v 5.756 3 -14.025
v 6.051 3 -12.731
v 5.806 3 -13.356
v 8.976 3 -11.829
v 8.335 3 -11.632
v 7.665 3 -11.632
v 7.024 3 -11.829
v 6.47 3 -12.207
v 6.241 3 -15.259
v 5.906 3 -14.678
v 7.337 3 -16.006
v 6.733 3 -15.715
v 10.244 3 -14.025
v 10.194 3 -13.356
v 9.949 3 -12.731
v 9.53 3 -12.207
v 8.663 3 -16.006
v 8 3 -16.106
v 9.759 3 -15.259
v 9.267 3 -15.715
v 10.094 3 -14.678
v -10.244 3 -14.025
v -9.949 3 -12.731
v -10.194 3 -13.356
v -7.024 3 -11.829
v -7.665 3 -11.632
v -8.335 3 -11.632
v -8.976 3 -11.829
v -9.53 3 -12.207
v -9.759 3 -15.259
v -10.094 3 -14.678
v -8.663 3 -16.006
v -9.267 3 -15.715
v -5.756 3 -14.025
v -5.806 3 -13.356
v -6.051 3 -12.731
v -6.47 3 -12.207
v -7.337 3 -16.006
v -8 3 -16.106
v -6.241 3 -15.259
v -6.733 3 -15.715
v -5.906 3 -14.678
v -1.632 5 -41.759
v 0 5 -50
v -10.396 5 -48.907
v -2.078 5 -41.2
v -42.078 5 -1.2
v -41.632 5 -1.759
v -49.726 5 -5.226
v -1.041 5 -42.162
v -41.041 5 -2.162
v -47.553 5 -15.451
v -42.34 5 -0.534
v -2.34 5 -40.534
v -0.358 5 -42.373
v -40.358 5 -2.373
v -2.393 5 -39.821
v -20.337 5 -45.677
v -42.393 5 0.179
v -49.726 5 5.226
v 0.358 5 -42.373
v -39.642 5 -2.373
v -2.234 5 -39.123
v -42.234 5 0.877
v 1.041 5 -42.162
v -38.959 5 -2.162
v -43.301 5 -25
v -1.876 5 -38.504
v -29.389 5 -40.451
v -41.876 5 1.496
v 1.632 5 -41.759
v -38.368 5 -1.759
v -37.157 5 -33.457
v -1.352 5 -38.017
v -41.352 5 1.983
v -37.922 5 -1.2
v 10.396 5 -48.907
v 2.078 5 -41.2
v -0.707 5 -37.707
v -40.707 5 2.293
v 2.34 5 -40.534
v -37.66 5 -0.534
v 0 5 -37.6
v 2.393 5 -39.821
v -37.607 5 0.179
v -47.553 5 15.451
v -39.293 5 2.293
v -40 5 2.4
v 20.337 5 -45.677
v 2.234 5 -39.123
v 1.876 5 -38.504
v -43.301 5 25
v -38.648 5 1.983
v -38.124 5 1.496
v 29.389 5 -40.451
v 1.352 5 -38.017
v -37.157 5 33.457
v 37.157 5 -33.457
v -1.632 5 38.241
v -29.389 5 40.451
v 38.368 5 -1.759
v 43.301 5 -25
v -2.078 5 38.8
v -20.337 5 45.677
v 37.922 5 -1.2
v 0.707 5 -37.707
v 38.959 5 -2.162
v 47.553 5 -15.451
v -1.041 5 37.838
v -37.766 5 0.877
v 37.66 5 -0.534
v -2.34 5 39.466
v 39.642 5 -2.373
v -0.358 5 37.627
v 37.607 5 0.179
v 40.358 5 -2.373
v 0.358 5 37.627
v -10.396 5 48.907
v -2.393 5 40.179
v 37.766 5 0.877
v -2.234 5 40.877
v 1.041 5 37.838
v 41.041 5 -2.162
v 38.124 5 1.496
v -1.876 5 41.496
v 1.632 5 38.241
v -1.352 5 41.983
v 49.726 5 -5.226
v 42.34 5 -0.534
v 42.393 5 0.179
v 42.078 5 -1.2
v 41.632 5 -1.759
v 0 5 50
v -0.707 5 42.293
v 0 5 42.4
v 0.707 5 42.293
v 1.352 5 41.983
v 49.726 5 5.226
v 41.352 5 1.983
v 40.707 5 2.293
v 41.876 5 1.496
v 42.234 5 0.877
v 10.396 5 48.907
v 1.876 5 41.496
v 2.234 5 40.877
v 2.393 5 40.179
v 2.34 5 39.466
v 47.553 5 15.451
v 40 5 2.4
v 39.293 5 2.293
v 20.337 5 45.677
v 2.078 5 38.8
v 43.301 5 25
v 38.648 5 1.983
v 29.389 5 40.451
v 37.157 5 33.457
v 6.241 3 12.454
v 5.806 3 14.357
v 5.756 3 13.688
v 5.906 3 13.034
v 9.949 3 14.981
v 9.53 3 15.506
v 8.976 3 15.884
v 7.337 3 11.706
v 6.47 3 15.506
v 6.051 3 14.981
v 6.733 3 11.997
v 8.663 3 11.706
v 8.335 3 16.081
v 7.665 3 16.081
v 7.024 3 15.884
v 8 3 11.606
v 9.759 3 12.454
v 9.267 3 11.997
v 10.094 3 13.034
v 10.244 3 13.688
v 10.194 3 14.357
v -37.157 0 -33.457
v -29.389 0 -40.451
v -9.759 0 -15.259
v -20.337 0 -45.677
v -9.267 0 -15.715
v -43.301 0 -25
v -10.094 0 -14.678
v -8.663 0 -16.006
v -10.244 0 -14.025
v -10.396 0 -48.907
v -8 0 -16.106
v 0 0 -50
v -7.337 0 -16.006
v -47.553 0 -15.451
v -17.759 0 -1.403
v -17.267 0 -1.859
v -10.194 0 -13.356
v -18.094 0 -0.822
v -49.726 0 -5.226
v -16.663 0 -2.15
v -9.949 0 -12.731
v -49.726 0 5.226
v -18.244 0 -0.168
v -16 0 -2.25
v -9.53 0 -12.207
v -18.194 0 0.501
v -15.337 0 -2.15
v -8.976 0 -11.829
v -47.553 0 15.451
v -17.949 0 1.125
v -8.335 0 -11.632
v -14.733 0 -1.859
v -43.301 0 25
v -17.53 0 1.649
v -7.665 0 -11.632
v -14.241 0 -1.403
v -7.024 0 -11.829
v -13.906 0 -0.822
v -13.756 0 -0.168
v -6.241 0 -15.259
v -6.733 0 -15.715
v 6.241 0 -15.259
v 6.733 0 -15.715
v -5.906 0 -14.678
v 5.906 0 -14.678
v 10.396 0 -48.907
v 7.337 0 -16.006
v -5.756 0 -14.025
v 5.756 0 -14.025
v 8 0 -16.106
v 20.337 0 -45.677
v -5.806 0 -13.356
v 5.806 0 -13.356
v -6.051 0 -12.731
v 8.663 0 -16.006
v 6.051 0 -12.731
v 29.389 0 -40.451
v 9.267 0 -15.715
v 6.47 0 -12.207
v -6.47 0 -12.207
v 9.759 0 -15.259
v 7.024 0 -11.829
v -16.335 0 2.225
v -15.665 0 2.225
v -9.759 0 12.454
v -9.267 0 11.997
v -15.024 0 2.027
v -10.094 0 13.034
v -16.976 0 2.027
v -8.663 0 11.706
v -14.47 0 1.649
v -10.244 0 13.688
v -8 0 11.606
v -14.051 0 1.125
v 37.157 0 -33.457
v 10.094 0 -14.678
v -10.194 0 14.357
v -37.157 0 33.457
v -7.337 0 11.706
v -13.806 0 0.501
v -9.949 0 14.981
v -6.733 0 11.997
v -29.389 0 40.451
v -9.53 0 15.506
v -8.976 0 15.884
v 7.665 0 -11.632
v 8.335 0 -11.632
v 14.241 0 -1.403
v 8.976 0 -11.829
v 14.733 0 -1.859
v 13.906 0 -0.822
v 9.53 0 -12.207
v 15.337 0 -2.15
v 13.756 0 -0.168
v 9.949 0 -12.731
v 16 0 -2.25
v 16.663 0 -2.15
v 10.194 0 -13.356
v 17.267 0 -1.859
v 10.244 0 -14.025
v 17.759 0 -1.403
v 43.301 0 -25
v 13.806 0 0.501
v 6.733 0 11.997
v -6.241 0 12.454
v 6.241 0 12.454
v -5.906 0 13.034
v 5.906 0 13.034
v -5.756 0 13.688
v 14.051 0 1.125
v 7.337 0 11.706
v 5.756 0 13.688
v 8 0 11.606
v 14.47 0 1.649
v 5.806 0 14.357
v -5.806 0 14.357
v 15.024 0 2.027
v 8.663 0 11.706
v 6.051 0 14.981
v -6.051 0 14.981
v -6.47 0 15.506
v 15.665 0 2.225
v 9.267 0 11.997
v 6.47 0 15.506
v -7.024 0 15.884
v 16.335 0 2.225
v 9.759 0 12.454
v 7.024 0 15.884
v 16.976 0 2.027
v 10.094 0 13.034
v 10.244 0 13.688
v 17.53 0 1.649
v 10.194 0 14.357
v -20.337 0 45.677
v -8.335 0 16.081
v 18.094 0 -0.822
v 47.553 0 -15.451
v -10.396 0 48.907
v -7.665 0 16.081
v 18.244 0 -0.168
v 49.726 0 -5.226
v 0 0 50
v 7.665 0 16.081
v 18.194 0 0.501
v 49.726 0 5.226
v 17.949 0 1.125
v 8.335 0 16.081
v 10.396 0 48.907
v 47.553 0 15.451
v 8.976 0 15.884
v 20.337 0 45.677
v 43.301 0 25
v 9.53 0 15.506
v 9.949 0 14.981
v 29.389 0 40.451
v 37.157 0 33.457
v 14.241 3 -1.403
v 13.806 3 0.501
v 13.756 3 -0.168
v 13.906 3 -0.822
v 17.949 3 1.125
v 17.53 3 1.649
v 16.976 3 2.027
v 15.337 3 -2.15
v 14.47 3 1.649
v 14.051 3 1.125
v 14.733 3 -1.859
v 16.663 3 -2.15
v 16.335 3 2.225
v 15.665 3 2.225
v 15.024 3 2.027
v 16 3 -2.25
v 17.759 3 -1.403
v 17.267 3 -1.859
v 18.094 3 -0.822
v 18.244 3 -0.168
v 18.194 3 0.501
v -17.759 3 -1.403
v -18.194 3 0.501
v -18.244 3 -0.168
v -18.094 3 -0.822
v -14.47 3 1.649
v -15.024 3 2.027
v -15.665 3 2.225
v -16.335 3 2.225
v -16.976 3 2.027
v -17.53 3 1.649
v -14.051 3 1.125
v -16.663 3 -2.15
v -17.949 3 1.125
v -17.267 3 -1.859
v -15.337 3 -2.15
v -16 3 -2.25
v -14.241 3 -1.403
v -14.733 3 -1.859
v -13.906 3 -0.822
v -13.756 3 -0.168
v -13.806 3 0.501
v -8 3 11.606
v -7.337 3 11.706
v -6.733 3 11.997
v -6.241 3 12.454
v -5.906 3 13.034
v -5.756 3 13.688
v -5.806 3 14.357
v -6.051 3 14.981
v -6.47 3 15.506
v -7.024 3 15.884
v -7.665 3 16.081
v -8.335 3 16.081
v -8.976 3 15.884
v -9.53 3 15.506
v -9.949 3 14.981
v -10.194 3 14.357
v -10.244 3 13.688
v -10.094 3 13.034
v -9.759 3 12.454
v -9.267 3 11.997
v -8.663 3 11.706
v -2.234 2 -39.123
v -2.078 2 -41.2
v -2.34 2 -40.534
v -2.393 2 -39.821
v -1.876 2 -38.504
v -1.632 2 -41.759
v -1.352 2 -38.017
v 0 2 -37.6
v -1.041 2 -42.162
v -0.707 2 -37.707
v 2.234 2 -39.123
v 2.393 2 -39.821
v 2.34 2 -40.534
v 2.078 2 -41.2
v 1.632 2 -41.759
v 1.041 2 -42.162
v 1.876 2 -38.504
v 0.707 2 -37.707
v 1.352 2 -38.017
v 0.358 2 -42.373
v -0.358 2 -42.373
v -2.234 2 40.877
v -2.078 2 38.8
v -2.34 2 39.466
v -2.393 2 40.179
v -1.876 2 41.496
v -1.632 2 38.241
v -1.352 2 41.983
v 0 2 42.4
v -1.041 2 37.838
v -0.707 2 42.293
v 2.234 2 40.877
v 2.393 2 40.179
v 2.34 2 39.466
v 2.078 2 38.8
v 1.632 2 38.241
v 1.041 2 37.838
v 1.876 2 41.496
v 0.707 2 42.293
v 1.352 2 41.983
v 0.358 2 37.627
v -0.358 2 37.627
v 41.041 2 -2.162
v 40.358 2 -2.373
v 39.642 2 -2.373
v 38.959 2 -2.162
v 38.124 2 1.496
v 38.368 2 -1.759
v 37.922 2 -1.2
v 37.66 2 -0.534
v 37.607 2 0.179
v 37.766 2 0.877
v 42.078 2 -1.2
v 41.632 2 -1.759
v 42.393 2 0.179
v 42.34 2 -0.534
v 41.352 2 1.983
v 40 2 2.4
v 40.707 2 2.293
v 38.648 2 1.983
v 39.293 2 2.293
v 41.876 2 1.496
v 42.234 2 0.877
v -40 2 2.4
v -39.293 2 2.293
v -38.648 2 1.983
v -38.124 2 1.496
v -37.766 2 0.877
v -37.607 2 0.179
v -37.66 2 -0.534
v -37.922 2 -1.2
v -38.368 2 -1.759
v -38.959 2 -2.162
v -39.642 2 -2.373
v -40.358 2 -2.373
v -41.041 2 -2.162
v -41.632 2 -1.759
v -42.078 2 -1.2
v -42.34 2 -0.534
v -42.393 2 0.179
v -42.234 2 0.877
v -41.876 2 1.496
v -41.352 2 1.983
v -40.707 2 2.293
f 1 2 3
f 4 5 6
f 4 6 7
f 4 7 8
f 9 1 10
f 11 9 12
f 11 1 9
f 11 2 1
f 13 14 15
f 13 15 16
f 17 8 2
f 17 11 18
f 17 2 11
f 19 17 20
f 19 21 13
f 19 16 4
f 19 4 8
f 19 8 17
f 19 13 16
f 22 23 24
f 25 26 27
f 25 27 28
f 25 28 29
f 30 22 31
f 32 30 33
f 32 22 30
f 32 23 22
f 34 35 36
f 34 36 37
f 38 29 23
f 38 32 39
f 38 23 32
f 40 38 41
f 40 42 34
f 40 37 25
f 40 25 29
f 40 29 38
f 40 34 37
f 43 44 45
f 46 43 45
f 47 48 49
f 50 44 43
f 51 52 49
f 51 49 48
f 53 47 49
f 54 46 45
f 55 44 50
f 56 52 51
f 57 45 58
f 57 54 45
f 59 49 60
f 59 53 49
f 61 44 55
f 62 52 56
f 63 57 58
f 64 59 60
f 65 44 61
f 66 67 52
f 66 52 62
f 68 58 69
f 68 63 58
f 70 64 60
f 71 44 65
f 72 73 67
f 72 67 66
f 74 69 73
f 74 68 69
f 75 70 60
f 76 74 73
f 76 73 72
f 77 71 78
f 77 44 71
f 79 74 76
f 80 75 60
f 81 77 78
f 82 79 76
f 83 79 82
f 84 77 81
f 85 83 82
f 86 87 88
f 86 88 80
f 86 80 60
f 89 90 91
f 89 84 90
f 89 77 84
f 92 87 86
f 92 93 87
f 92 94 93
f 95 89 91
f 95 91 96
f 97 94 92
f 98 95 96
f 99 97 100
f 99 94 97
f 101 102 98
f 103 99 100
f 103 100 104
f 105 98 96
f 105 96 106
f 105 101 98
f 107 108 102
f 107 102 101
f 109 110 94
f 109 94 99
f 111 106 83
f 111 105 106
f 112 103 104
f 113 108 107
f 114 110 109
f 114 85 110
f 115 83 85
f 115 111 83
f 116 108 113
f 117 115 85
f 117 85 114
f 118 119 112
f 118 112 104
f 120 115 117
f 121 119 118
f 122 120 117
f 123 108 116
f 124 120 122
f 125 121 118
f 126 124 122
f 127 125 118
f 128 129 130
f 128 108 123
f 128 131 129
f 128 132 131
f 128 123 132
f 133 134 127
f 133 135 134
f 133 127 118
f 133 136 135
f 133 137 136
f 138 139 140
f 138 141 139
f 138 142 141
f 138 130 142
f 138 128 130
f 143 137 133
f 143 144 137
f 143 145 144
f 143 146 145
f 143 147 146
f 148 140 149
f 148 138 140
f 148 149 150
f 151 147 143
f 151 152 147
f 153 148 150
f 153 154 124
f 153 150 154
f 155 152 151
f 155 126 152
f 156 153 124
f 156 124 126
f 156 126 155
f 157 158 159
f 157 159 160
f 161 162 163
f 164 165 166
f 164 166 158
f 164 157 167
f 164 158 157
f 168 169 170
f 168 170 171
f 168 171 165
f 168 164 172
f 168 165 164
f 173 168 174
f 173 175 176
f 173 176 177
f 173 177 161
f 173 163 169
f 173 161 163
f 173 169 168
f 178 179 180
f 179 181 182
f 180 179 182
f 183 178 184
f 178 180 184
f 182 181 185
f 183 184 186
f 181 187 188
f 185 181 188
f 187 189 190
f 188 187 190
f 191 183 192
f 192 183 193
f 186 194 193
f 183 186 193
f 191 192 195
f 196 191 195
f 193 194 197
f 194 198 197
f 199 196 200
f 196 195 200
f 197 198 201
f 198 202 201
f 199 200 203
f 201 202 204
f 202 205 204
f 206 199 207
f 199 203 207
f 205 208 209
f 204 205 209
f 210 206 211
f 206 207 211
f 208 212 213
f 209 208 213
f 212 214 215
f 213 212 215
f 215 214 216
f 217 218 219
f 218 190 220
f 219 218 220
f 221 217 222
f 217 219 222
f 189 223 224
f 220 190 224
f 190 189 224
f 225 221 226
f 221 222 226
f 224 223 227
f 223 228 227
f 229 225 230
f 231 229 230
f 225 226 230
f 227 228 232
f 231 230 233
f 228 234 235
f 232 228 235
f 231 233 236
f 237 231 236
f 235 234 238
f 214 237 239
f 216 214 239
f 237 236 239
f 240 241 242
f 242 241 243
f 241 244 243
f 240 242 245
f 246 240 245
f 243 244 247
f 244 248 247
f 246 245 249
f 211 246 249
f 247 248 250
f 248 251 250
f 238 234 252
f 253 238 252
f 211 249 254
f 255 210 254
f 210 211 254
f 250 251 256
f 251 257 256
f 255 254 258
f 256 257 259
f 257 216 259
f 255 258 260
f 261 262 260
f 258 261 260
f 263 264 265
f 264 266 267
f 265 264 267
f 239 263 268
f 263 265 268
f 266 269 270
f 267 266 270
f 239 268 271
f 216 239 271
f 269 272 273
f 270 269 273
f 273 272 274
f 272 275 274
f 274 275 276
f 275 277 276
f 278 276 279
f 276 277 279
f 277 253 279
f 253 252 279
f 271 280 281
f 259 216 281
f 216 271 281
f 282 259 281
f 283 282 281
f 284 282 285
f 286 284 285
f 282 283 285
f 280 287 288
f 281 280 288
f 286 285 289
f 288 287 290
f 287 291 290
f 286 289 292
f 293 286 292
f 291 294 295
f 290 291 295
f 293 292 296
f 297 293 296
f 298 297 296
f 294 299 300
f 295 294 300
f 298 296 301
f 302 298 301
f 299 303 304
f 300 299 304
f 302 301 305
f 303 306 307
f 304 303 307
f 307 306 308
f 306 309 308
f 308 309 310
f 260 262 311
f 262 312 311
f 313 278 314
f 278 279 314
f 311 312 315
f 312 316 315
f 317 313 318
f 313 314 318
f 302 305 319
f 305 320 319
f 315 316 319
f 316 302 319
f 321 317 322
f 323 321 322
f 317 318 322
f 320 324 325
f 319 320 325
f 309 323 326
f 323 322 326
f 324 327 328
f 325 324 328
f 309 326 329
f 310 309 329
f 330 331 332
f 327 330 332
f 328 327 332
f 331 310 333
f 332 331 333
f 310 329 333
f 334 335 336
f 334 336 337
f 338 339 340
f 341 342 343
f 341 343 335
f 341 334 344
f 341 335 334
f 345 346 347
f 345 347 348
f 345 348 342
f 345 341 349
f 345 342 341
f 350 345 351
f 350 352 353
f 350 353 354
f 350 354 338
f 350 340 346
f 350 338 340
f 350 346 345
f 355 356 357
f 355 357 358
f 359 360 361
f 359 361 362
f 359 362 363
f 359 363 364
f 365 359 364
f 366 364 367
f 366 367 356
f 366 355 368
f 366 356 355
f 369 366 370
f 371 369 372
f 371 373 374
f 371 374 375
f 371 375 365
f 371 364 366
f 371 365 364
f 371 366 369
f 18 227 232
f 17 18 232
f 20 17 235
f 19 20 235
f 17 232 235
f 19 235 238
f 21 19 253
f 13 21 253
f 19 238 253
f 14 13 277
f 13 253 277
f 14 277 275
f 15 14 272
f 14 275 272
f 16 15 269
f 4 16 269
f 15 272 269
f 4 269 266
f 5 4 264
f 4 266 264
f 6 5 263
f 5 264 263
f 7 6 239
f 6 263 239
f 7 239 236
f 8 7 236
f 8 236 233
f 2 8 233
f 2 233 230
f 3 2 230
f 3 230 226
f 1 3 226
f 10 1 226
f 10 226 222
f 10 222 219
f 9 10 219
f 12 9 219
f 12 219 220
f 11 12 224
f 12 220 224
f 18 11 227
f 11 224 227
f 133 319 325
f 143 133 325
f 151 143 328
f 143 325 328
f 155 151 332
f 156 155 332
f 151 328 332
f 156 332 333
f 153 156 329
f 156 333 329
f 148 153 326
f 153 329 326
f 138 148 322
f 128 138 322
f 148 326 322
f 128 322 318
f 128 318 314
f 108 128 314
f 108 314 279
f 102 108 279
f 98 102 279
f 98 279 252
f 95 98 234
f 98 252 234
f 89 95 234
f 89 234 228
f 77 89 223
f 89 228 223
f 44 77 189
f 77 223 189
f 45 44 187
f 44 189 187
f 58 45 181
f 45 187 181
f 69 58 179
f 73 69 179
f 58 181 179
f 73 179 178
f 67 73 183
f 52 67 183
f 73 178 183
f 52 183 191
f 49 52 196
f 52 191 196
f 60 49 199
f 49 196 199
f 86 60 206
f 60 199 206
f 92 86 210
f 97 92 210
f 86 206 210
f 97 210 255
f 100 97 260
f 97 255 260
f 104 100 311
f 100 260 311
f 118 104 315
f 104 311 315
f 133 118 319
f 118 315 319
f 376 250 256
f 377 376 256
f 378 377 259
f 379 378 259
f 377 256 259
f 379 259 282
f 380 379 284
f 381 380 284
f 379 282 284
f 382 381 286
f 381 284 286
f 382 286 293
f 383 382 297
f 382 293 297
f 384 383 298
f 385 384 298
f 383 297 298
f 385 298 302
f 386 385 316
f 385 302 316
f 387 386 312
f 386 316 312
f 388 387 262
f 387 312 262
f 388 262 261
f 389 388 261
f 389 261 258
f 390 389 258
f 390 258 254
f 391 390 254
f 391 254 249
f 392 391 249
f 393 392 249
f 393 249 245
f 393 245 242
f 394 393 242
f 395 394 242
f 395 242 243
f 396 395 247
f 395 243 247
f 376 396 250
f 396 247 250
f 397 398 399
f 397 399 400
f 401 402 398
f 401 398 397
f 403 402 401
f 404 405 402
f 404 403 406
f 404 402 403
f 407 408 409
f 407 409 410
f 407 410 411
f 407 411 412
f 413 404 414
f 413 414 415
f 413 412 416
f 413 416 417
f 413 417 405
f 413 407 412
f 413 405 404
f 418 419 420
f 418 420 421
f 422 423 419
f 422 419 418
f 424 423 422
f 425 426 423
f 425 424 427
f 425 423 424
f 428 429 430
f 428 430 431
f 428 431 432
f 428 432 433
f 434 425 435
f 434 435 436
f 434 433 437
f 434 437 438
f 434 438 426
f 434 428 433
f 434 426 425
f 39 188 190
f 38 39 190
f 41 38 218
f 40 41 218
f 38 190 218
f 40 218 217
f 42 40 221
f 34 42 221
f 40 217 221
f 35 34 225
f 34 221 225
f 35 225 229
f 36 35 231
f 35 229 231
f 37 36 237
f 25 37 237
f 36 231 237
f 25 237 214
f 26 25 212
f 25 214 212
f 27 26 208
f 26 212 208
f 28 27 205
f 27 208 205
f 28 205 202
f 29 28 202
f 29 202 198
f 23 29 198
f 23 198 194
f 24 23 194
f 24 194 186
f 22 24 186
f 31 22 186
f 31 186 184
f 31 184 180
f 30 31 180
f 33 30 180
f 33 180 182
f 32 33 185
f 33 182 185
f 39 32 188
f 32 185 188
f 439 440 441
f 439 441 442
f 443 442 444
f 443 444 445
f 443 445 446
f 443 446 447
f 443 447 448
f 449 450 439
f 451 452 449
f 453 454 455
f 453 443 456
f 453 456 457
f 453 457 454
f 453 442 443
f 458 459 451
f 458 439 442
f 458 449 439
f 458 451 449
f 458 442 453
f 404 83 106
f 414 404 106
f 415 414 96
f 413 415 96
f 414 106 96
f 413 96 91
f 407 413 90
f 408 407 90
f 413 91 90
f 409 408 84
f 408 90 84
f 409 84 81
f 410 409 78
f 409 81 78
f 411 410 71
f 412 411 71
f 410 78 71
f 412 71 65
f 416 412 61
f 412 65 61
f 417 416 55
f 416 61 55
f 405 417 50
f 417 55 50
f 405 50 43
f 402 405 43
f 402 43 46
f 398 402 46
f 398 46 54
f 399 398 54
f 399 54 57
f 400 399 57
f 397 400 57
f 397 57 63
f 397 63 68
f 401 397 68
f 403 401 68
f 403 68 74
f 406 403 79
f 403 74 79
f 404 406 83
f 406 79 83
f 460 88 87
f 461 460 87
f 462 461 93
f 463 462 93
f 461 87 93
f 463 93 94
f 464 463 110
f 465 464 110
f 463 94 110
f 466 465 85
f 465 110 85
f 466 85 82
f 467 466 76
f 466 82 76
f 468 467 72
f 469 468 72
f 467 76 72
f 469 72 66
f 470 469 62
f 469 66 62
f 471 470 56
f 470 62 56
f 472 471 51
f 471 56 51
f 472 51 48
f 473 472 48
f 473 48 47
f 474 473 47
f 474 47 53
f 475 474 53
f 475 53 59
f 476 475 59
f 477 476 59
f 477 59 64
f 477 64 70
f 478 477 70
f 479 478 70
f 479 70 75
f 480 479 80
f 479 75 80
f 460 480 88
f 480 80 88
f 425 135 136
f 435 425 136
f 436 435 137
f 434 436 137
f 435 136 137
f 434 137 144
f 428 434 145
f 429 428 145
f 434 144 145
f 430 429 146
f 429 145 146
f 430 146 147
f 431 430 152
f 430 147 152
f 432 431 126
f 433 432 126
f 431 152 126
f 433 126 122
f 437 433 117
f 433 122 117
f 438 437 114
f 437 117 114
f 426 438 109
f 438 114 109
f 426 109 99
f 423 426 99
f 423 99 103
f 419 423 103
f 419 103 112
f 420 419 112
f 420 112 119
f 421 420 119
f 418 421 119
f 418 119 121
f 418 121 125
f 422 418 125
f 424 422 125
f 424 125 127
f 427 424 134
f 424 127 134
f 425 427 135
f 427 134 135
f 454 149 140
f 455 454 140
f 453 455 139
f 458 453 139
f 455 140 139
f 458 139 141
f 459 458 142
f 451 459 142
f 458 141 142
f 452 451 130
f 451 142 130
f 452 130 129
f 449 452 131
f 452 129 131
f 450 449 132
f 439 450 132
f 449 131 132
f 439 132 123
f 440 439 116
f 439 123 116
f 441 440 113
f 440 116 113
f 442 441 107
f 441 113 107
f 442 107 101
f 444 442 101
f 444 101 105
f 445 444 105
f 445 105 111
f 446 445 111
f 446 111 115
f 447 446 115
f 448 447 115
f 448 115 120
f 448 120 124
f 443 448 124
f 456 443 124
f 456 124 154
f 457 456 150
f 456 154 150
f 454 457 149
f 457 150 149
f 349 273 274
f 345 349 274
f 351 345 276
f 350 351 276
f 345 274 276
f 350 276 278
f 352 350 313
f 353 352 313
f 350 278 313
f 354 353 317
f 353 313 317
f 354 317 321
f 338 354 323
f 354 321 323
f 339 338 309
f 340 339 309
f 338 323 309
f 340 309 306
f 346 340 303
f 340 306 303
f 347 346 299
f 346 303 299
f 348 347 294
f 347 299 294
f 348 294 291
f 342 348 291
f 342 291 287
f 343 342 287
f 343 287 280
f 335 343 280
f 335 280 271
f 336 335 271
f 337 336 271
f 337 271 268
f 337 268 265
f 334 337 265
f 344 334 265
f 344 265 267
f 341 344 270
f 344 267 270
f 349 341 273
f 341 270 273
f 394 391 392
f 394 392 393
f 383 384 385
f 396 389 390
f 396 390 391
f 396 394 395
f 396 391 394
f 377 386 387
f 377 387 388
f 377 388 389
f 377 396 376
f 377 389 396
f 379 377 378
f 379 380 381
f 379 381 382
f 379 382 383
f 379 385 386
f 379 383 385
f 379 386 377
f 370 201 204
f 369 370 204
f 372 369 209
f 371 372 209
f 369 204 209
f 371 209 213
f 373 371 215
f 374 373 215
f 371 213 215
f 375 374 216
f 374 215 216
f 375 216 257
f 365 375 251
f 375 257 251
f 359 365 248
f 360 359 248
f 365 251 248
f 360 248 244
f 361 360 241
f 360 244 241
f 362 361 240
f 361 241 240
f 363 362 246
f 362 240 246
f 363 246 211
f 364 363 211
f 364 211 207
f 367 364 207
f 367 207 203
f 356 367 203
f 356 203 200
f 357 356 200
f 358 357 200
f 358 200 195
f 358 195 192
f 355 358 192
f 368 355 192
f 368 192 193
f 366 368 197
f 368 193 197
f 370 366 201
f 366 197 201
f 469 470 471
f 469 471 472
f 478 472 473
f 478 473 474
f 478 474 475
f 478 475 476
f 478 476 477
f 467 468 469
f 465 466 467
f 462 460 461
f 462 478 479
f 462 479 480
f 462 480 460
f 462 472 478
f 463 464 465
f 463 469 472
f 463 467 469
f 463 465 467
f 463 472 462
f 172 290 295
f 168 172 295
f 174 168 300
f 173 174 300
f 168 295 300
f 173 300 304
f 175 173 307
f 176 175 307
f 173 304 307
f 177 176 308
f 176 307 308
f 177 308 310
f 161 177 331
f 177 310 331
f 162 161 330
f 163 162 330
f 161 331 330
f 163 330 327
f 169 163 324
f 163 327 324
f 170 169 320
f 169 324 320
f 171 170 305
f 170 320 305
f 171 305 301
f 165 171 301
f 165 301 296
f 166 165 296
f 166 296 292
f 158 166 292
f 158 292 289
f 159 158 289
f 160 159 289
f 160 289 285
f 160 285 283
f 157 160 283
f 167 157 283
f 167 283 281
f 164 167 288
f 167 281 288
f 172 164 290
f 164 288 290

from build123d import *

# Parameters (mm, degrees)
SKETCH_1_R          = 50
EXTRUDE_1_DEPTH     = 5
SKETCH_3_R          = 2.25
CUT_EXTRUDE_1_DEPTH = 3
SKETCH_4_R          = 2.4
CUT_EXTRUDE_2_DEPTH = 3


with BuildPart() as part:
    # 草图1 → 凸台-拉伸1 (new body)
    with BuildSketch(Plane(origin=(0, 0, 0), x_dir=(1, 0, 0), z_dir=(0, 1, 0))):
        Circle(SKETCH_1_R)
    extrude(amount=EXTRUDE_1_DEPTH)

    # 草图3 → 切除-拉伸1 (cut)
    with BuildSketch(Plane.XZ):
        with Locations((8, 13.856406461)):
            Circle(SKETCH_3_R)
        with Locations((16, 0)):
            Circle(SKETCH_3_R)
        with Locations((8, -13.856406461)):
            Circle(SKETCH_3_R)
        with Locations((-8, -13.856406461)):
            Circle(SKETCH_3_R)
        with Locations((-16, 0)):
            Circle(SKETCH_3_R)
        with Locations((-8, 13.856406461)):
            Circle(SKETCH_3_R)
    extrude(amount=-CUT_EXTRUDE_1_DEPTH, mode=Mode.SUBTRACT)

    # 草图4 → 切除-拉伸2 (cut)
    with BuildSketch(Plane(origin=(0, 5, 0), x_dir=(1, 0, 0), z_dir=(0, 1, 0))):
        with Locations((0, 40)):
            Circle(SKETCH_4_R)
        with Locations((40, 0)):
            Circle(SKETCH_4_R)
        with Locations((0, -40)):
            Circle(SKETCH_4_R)
        with Locations((-40, 0)):
            Circle(SKETCH_4_R)
    extrude(amount=-CUT_EXTRUDE_2_DEPTH, mode=Mode.SUBTRACT)


solid = part.part
